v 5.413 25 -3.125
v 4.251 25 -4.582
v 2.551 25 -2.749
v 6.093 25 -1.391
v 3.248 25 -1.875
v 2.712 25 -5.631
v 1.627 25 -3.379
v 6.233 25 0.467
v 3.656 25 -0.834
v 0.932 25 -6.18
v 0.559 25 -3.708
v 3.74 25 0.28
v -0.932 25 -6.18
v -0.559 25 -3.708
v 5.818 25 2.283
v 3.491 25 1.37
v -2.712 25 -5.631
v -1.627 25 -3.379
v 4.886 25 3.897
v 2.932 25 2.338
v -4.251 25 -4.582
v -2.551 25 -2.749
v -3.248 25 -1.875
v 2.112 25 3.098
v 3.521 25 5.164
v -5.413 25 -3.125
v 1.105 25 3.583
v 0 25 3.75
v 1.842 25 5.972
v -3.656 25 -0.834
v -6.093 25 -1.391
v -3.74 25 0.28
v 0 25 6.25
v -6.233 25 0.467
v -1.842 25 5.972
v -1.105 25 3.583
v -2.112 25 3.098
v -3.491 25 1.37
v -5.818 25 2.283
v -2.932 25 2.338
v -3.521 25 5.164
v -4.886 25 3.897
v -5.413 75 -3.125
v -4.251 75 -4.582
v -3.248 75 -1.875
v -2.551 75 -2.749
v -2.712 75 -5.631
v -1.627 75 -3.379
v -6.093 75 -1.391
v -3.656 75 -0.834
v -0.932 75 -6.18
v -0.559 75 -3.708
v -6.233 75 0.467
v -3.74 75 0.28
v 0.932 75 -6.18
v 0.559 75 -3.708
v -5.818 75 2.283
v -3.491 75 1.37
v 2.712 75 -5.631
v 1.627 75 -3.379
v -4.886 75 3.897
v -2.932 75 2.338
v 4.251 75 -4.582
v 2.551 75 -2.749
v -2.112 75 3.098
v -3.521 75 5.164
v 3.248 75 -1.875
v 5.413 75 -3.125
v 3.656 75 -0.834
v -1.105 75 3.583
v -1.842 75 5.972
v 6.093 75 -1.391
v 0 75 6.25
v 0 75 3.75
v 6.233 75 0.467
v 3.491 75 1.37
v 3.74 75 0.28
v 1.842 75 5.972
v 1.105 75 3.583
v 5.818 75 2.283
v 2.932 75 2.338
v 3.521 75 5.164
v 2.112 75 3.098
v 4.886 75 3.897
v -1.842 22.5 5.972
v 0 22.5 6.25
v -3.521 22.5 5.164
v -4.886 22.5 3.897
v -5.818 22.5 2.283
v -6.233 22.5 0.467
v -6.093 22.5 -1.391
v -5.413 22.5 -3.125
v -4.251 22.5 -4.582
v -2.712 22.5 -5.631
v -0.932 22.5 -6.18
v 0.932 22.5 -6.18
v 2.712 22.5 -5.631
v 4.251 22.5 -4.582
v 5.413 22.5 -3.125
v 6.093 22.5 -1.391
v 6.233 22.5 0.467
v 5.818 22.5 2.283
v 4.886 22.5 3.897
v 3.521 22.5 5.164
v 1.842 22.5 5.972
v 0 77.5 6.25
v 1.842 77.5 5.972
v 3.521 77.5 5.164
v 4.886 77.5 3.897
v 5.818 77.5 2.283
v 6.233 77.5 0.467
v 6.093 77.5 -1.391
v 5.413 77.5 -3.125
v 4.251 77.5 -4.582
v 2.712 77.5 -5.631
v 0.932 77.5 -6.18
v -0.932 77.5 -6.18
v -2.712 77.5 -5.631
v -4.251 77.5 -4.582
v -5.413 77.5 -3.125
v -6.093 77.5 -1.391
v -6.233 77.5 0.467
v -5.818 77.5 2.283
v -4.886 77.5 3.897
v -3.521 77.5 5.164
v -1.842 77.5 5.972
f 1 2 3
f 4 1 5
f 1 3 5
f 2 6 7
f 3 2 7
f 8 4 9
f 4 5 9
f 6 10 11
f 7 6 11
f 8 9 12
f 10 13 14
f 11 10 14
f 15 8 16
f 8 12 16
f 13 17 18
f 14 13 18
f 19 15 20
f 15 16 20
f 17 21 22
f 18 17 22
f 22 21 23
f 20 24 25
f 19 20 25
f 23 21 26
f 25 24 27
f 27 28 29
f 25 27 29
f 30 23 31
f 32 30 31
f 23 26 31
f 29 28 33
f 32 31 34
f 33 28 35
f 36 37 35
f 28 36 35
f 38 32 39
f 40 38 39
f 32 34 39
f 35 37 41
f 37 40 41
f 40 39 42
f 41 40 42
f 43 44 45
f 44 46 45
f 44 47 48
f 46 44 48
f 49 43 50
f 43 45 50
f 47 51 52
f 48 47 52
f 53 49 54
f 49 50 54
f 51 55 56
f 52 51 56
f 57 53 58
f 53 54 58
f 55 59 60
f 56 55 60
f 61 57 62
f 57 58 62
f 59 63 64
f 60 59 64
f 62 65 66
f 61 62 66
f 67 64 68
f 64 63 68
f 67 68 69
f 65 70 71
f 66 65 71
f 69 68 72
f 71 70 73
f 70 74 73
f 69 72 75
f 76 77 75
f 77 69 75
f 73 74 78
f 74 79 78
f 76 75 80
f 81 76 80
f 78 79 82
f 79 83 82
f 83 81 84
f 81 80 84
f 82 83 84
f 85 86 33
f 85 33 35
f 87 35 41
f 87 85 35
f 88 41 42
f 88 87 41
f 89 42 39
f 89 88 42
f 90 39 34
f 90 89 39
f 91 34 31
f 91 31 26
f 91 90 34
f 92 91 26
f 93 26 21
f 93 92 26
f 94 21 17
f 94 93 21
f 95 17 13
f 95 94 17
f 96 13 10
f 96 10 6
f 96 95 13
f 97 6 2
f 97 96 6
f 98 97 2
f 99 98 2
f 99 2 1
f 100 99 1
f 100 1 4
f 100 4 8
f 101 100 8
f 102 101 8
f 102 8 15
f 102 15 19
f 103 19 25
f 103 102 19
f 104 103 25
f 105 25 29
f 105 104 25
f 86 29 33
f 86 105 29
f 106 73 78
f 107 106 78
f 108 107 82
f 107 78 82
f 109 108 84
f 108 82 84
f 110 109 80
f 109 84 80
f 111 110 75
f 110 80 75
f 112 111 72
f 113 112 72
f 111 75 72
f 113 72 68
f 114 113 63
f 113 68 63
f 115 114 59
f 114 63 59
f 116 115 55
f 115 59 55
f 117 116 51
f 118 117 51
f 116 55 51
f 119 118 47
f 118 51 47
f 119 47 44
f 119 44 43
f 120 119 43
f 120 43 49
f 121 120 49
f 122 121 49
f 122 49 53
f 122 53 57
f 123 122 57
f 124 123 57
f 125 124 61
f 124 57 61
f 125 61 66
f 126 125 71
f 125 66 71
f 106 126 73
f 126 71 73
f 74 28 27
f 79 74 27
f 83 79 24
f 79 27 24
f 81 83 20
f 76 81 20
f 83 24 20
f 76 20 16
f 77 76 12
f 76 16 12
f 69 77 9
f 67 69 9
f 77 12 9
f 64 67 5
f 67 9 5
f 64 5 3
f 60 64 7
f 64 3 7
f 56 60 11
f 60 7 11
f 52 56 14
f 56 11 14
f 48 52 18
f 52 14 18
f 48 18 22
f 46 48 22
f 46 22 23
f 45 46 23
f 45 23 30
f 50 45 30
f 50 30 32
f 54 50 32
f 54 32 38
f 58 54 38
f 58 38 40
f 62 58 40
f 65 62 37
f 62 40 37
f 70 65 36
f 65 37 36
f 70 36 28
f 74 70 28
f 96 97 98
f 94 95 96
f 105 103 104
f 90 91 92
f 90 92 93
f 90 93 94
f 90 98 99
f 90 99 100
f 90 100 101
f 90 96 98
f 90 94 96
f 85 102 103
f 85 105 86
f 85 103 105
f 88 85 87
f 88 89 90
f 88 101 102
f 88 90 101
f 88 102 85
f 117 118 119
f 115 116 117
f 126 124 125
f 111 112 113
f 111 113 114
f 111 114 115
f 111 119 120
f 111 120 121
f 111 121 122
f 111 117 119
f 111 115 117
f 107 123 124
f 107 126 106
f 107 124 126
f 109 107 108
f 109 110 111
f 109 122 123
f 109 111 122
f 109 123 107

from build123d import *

# Parameters (mm, degrees)
SKETCH2_R           = 7.5
BOSS_EXTRUDE1_DEPTH = 100
SKETCH3_R           = 12.5
BOSS_EXTRUDE2_DEPTH = 5
BOSS_EXTRUDE3_START = 5
SKETCH4_R           = 12.5
BOSS_EXTRUDE3_DEPTH = 5
SCALE1_SCALE        = 0.5


with BuildPart() as part:
    # Sketch2 → Boss-Extrude1 (new body)
    with BuildSketch(Plane(origin=(0, 0, 0), x_dir=(1, 0, 0), z_dir=(0, 1, 0))):
        with Locations(Location((0, 0, 0), (0, 0, 270))):
            Circle(SKETCH2_R)
    extrude(amount=BOSS_EXTRUDE1_DEPTH)

    # Sketch3 → Boss-Extrude2 (add)
    with BuildSketch(Plane(origin=(0, 100, 0), x_dir=(1, 0, 0), z_dir=(0, 1, 0))):
        with Locations(Location((0, 0, 0), (0, 0, 270))):
            Circle(SKETCH3_R)
    extrude(amount=BOSS_EXTRUDE2_DEPTH)

    # Sketch4 → Boss-Extrude3 (add)
    with BuildSketch(Plane.XZ.offset(BOSS_EXTRUDE3_START)):
        with Locations(Location((0, 0, 0), (0, 0, 90))):
            Circle(SKETCH4_R)
    extrude(amount=-BOSS_EXTRUDE3_DEPTH)


with BuildPart() as part_1:
    # Scale1: scaled about (0, 50, 0)
    add(part.part.scale(SCALE1_SCALE).moved(Location((0, 25, 0))))


solid = part_1.part
